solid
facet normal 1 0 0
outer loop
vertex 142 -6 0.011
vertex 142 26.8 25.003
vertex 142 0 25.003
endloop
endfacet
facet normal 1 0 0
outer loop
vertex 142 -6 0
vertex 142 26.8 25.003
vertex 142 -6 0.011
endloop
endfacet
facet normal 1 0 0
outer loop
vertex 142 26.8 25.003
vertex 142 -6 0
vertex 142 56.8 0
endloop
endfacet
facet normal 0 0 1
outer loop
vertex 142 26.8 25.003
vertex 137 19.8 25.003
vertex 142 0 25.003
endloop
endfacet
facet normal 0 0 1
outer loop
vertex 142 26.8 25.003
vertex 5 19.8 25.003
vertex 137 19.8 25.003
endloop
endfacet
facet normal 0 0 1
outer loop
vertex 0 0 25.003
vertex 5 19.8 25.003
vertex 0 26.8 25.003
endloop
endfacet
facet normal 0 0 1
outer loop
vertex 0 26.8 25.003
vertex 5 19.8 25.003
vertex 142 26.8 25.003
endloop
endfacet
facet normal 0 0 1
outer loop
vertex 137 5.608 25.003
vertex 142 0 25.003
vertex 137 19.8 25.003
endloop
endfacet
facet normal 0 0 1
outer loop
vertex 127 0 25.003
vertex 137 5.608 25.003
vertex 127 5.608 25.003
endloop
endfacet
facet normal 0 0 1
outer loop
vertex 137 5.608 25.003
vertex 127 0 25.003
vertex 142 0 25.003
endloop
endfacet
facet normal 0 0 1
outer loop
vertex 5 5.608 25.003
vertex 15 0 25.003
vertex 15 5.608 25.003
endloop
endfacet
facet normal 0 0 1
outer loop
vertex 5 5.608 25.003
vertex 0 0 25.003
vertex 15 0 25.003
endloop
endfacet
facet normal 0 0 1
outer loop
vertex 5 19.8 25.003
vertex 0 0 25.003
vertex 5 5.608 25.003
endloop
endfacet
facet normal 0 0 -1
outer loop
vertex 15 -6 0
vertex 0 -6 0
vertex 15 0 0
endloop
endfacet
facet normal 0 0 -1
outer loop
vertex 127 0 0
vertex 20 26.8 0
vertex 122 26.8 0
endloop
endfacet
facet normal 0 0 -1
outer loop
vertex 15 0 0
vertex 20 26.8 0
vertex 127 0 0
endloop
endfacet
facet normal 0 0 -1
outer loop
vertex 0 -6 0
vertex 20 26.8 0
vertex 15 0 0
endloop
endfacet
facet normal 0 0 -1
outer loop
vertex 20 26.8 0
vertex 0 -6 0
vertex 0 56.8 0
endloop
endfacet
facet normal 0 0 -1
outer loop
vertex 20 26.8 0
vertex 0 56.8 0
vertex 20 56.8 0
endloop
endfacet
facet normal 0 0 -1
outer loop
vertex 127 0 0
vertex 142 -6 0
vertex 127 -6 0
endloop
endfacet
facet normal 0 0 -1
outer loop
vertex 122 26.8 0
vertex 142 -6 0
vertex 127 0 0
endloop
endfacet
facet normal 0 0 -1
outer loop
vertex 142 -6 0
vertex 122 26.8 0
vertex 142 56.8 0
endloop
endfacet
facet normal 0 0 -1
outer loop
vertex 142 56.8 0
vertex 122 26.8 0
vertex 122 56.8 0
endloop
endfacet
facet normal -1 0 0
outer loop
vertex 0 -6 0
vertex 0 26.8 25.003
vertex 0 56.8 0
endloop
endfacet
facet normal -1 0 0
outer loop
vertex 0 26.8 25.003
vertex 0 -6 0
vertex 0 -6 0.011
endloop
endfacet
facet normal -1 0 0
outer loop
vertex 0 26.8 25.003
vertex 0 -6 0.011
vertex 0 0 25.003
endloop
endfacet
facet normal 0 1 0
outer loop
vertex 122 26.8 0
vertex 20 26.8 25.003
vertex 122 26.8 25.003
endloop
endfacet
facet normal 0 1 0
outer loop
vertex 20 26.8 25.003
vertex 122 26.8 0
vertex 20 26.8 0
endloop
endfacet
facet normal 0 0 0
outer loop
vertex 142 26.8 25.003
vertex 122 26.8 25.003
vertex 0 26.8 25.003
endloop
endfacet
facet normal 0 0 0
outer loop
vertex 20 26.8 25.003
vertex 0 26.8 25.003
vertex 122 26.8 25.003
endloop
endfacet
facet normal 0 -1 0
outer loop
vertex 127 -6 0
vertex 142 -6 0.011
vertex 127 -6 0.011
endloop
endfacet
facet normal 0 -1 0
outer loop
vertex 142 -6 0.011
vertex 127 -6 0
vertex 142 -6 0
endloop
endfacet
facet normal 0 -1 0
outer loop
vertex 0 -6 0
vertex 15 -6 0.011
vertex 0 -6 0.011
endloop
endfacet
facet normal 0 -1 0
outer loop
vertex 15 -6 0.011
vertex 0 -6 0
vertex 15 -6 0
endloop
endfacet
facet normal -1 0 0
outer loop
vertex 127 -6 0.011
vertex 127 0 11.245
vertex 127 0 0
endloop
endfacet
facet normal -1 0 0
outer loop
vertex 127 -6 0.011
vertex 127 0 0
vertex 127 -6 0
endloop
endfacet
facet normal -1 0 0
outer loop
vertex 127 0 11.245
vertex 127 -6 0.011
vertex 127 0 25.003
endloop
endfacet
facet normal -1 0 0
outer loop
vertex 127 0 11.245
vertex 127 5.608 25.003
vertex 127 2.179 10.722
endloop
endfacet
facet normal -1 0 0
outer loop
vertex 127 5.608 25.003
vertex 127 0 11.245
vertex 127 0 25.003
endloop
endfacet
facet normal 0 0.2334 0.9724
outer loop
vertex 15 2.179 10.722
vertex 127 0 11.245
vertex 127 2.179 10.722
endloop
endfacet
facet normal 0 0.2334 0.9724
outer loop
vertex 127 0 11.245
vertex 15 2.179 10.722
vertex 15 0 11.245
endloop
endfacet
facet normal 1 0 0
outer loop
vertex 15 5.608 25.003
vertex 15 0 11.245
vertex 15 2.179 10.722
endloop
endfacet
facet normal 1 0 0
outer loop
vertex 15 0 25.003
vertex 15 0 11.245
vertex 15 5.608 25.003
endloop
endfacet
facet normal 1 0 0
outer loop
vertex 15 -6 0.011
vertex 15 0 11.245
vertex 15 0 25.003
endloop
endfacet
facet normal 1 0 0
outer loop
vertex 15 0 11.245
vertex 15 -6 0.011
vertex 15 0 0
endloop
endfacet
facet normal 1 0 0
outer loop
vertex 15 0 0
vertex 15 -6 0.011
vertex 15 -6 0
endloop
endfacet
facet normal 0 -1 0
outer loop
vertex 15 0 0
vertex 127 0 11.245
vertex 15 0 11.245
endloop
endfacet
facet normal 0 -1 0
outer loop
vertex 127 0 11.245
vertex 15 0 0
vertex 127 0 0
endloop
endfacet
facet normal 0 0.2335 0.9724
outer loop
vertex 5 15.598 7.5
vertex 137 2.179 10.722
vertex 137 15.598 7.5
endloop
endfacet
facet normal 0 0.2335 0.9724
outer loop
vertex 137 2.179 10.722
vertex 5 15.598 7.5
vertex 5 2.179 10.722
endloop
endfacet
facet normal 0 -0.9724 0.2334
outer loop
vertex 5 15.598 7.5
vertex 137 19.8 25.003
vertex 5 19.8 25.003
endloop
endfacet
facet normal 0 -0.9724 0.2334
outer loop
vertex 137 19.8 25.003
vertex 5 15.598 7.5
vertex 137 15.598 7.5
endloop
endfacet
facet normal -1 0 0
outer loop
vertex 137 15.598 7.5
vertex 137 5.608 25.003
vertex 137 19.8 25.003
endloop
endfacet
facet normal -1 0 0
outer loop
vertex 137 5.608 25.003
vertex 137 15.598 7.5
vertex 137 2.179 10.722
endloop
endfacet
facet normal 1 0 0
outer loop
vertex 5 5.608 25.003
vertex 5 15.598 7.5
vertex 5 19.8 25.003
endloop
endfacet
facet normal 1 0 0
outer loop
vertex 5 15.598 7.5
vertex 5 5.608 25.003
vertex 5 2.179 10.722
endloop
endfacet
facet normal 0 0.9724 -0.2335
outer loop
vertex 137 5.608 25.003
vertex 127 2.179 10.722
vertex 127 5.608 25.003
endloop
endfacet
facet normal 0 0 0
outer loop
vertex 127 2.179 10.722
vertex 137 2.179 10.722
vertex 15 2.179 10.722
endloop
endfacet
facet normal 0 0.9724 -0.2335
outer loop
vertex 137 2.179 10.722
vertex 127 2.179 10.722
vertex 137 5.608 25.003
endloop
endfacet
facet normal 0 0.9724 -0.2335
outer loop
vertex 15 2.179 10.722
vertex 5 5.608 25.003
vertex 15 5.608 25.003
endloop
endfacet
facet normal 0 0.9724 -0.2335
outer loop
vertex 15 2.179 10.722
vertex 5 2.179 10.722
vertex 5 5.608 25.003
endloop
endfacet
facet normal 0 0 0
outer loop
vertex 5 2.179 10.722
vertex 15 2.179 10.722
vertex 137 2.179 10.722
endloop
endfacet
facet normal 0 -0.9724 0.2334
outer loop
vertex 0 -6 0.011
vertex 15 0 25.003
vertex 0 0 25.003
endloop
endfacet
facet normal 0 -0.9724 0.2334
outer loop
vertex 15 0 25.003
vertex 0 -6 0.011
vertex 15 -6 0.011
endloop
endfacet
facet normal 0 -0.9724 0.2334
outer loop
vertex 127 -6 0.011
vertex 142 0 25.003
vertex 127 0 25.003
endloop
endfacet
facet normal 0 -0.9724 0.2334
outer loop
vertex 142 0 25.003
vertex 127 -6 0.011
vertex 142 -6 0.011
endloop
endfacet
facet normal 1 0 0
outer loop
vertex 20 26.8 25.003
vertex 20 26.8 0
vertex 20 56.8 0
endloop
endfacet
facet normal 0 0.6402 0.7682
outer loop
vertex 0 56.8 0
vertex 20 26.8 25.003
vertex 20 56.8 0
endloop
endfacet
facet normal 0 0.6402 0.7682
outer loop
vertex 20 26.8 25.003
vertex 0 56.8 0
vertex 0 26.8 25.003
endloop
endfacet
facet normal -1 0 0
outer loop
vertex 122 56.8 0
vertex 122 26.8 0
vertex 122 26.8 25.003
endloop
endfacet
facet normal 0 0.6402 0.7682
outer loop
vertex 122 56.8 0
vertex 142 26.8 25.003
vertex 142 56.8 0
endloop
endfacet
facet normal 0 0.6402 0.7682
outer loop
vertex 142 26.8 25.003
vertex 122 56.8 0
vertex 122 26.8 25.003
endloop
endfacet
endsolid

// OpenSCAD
phone_width = 130; // iPhone 5s held horizontal, with case
phone_thickness = 11.8; // with case

phone_angle = 76.5;
phone_insert_depth = 18; // how much of phone you want inserted
phone_insert_height = phone_insert_depth * sin(phone_angle); // how far into block we need to go to achieve depth
stand_base_height = 7.5;
stand_height = stand_base_height + phone_insert_height;
slide_gap = 2; // how much wiggle room to add between phone and stand


side_wall_thickness = 5;
front_wall_thickness = 6;
front_wall_width = 15;
back_wall_thickness = 7;
support_extends = 30;
support_thickness = 20;
support_angle = 40;

phone_hole_width = phone_width + slide_gap;
phone_hole_thickness = phone_thickness + slide_gap;
phone_hole_height = phone_insert_depth * 4; // will extend out top

block_width = phone_hole_width + (side_wall_thickness * 2);
block_depth = phone_hole_thickness + back_wall_thickness + front_wall_thickness;
block_height = stand_height;

extra = 1;



stand();

translate([0, block_depth, 0])
support();

translate([block_width - support_thickness, block_depth, 0])
support();


module stand(){
  difference(){
    union(){
      cube([block_width, block_depth, block_height]);

      translate([0, -front_wall_thickness, 0])
        cube([block_width, front_wall_thickness, block_height]);
    }

    phone_insert();

    front_angle_shave();

    front_viewer();
  }
}

module support(){
  rotate([90,0,90])
  linear_extrude(height=support_thickness)
  polygon(points=[
    [0,0],
    [support_extends,0],
    [0, stand_height]
      ]);
}

backstop_base = phone_insert_depth * sin(90 - phone_angle);

module phone_insert(){
  // the extra thickness added to the bottom of the back wall, because of angled phone insert
  translate([side_wall_thickness, block_depth - back_wall_thickness - backstop_base, stand_base_height])
    rotate([(phone_angle-90), 0, 0])
    translate([0, -phone_hole_thickness, 0]) // to rotate around back left bottom corner
    cube([phone_hole_width, phone_hole_thickness, phone_hole_height]);
}

module front_angle_shave(){
  extra_sink = 5;
  shave_y_offset = (block_height + extra_sink) * sin(90-phone_angle) / sin(phone_angle);
    translate([-extra, -shave_y_offset, -extra_sink ])
    rotate([phone_angle-90, 0, 0])
    translate([0, -block_depth, 0])
    cube([block_width + 2 * extra, block_depth, block_height*5]);
}

module front_viewer(){
  viewer_inset = block_height * sin(90-phone_angle) / sin(phone_angle);

  // hole that extends out in front of phone, at same angle
  translate([front_wall_width,  block_depth - back_wall_thickness - backstop_base, stand_base_height])
  rotate([phone_angle-90, 0, 0])
  translate([0, -block_depth, 0])
    cube([block_width - (front_wall_width * 2), block_depth, block_height * 2]);

  // hole in between front walls
  translate([front_wall_width, -(front_wall_thickness + extra), -extra])
    cube([block_width - (front_wall_width * 2), front_wall_thickness + extra, block_height + extra * 2]);
}
